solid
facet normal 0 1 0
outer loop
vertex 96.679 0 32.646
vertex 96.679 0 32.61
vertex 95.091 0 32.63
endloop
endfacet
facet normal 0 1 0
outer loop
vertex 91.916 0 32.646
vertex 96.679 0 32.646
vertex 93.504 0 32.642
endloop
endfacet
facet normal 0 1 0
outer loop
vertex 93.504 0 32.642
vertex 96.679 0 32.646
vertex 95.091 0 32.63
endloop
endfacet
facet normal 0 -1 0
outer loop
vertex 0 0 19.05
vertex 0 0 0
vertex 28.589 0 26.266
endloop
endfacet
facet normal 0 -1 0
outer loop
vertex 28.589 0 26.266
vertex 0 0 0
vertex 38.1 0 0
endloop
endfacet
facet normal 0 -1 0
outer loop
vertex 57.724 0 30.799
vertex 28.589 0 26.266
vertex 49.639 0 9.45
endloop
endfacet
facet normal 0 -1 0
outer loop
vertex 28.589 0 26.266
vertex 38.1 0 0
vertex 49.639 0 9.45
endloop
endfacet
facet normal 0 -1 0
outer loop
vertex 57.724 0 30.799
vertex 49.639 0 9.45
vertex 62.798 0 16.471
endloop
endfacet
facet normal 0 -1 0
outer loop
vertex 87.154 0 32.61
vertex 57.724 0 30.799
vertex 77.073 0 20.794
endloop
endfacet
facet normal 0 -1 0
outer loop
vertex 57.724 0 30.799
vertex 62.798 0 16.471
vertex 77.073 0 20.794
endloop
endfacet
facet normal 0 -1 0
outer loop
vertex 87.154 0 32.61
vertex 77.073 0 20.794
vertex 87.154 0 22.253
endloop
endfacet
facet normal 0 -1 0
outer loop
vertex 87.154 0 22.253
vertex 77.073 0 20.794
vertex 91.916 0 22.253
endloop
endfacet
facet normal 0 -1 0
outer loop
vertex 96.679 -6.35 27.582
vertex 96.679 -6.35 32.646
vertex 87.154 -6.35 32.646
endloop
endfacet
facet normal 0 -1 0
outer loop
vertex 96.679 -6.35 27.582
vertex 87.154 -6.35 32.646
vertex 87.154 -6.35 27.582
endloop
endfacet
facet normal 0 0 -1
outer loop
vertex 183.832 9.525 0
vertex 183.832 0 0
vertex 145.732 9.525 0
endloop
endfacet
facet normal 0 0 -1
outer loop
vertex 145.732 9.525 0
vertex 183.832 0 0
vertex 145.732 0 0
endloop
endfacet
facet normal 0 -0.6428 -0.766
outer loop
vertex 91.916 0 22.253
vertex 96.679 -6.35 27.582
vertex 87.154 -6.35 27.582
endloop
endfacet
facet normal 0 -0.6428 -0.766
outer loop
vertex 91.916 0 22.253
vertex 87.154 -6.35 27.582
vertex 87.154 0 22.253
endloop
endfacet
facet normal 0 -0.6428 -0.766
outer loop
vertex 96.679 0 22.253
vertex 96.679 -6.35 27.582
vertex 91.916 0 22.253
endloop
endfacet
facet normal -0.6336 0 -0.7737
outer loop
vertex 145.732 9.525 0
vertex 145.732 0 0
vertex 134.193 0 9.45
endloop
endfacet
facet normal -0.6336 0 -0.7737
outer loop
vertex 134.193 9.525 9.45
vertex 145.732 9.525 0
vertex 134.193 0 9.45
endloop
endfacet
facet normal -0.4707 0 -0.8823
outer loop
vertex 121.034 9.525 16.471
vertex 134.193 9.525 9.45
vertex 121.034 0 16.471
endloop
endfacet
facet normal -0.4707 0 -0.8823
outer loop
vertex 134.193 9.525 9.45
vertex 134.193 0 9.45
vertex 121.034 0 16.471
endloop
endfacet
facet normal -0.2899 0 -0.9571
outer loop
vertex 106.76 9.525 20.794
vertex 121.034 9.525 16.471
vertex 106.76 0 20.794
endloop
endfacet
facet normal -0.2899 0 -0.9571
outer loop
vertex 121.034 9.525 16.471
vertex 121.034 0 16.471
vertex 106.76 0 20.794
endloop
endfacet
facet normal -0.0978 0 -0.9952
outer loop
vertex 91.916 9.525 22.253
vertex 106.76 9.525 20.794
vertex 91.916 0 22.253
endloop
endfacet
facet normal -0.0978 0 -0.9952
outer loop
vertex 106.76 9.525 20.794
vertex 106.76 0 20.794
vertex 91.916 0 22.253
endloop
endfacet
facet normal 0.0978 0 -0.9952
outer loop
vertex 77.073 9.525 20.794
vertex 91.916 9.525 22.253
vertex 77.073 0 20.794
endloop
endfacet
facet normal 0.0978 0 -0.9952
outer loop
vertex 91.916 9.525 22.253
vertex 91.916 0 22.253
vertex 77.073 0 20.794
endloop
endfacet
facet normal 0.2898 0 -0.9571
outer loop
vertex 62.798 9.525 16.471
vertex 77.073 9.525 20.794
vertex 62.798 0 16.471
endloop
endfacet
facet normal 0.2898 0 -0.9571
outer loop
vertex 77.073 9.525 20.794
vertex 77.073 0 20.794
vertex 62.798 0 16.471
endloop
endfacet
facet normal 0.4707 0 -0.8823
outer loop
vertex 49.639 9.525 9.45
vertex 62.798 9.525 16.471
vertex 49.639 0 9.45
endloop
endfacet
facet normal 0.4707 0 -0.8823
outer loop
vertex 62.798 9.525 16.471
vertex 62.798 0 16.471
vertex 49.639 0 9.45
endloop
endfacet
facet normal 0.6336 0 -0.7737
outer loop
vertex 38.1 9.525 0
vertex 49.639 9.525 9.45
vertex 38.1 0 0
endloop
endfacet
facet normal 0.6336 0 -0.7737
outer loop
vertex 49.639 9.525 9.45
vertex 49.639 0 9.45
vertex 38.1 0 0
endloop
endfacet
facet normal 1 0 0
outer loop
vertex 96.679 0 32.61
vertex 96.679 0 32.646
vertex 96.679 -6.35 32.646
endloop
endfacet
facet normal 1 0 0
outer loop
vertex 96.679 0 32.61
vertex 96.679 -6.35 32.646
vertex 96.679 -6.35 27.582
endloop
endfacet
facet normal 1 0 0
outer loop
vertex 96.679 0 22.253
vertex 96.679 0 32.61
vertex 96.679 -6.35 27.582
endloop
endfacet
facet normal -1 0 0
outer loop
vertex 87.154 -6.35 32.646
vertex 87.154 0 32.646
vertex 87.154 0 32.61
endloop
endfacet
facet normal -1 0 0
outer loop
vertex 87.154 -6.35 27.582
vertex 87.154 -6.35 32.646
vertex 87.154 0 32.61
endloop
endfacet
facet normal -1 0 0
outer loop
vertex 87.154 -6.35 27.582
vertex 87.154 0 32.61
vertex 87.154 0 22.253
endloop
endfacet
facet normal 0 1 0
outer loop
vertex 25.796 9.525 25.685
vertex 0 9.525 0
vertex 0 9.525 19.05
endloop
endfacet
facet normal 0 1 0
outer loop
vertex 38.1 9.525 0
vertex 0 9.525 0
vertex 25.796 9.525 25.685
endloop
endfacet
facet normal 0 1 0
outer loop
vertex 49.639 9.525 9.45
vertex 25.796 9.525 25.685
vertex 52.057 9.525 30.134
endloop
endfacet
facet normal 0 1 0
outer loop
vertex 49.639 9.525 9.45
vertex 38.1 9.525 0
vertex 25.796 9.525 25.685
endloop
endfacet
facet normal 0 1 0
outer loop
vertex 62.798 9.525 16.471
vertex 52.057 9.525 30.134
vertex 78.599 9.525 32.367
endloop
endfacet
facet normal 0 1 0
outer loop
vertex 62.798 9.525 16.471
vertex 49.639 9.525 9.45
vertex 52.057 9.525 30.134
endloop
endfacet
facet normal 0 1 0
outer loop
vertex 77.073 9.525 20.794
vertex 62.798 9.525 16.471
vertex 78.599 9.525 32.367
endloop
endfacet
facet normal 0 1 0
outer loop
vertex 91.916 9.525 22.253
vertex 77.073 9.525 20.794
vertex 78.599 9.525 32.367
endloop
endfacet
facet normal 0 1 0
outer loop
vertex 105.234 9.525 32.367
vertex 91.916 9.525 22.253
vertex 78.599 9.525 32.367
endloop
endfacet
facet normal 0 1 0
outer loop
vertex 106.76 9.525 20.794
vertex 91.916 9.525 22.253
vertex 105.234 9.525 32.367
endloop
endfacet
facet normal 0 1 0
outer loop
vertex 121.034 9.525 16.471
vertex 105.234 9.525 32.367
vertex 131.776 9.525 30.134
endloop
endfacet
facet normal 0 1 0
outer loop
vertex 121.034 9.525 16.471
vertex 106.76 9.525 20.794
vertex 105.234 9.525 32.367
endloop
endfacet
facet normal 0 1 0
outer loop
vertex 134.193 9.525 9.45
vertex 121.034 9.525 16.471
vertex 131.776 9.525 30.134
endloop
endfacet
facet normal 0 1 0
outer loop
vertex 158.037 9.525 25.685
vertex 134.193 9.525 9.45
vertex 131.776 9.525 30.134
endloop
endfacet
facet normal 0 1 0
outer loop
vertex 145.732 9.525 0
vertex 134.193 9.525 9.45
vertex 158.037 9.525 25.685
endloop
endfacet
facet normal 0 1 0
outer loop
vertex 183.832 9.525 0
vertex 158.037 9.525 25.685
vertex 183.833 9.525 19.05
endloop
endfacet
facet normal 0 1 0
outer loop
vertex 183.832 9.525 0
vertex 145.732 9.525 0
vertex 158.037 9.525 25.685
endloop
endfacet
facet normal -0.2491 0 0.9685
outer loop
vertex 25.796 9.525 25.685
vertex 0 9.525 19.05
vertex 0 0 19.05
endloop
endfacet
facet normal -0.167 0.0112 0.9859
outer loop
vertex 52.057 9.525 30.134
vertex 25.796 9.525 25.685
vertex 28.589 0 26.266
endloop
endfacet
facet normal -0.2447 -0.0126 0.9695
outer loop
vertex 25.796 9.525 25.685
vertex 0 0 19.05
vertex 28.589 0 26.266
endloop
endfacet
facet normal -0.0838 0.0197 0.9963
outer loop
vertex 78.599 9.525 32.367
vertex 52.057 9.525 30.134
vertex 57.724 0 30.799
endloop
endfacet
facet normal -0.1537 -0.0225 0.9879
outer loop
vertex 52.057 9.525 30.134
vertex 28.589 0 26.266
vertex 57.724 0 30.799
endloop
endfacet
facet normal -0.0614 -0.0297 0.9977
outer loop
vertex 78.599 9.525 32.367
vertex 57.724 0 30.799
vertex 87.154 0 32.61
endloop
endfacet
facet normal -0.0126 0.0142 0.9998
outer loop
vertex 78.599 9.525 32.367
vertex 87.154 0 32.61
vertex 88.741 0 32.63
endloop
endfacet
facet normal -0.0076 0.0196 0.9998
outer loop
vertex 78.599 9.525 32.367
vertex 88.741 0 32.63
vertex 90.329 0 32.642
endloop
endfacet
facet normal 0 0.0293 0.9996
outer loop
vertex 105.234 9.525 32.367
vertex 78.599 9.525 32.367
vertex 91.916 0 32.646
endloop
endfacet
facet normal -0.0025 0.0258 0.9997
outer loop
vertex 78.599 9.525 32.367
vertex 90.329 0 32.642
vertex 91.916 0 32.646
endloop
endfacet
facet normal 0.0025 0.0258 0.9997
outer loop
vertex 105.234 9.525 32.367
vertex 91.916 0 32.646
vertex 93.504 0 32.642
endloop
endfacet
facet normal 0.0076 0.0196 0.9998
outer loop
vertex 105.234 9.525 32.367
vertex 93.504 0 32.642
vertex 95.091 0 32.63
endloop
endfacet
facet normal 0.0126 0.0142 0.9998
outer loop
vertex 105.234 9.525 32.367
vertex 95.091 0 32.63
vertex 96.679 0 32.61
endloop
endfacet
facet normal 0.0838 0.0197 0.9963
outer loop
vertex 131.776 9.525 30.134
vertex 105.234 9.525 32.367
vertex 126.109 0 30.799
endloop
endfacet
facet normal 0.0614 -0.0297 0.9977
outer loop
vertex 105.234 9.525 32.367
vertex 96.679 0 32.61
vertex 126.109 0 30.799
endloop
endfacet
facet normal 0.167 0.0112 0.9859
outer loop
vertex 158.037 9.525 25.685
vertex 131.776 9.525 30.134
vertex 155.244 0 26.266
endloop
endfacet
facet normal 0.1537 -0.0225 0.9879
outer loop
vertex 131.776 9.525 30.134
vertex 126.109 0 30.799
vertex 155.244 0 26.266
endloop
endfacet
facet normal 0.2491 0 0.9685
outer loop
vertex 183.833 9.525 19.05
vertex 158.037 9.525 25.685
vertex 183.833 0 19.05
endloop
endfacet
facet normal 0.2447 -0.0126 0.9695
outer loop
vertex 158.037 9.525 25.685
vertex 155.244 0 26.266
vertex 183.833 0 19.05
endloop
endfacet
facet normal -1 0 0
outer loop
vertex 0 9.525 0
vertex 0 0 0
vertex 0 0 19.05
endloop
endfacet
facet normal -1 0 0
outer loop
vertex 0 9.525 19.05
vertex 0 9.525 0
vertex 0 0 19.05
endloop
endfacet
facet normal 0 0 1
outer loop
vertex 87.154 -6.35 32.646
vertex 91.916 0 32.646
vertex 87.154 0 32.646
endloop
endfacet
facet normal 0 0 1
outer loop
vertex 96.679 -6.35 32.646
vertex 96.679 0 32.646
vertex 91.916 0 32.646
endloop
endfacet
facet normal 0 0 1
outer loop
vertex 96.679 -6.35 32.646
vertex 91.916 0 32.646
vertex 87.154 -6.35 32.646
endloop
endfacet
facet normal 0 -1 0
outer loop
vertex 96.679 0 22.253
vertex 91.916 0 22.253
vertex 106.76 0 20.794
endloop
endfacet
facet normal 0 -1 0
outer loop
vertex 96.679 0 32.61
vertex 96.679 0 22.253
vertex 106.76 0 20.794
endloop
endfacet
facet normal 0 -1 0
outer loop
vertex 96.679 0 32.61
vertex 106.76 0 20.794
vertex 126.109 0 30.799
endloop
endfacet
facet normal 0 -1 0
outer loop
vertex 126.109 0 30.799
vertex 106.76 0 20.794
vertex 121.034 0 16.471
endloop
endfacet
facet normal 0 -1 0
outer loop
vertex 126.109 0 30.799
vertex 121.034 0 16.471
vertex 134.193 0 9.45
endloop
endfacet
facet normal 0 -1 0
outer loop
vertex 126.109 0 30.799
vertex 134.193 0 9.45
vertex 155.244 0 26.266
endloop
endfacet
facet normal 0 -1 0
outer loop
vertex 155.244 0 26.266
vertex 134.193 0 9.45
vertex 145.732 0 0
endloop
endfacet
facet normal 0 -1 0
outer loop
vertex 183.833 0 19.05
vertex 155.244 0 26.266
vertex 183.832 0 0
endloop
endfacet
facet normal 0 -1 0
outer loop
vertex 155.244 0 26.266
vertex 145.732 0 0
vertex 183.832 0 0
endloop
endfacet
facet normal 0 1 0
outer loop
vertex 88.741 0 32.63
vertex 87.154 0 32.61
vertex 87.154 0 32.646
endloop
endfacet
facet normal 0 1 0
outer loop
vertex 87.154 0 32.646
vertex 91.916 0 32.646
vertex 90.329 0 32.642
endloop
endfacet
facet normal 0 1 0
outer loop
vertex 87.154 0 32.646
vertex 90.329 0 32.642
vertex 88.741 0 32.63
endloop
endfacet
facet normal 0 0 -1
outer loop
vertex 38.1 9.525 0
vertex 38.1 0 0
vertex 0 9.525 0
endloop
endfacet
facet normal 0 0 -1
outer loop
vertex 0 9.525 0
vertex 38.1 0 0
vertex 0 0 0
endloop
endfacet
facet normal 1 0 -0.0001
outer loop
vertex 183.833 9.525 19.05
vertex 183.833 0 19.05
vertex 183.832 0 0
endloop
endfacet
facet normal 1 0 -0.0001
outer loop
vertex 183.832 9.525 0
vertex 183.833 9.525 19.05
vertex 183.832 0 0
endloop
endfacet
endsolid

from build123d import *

# Parameters (mm, degrees)
BOSS_EXTRUDE1_DEPTH = 9.525
BOSS_EXTRUDE2_DEPTH = 4.7625


with BuildPart() as part:
    # Sketch1 → Boss-Extrude1 (new body)
    with BuildSketch(Plane(origin=(0, 0, 0), x_dir=(1, 0, 0), z_dir=(0, 1, 0))):
        with BuildLine():
            Line((0, 0), (0, -19.05))
            ThreePointArc((0, -19.05), (91.91625, -32.645980635), (183.8325, -19.05))
            Line((183.8325, -19.05), (183.8325, 0))
            Line((183.8325, 0), (145.7325, 0))
            ThreePointArc((145.7325, 0), (91.91625, -22.253255558), (38.1, 0))
            Line((38.1, 0), (0, 0))
        make_face()
    extrude(amount=BOSS_EXTRUDE1_DEPTH)

    # Sketch2 → Boss-Extrude2 (add, symmetric)
    with BuildSketch(Plane(origin=(91.91625, 0, 0), x_dir=(0, 0, -1), z_dir=(1, 0, 0))):
        Polygon((-32.645980635, 0), (-32.645980635, -6.35), (-27.581538216, -6.35), (-22.253255558, 0), align=None)
    extrude(amount=BOSS_EXTRUDE2_DEPTH, both=True)


solid = part.part
